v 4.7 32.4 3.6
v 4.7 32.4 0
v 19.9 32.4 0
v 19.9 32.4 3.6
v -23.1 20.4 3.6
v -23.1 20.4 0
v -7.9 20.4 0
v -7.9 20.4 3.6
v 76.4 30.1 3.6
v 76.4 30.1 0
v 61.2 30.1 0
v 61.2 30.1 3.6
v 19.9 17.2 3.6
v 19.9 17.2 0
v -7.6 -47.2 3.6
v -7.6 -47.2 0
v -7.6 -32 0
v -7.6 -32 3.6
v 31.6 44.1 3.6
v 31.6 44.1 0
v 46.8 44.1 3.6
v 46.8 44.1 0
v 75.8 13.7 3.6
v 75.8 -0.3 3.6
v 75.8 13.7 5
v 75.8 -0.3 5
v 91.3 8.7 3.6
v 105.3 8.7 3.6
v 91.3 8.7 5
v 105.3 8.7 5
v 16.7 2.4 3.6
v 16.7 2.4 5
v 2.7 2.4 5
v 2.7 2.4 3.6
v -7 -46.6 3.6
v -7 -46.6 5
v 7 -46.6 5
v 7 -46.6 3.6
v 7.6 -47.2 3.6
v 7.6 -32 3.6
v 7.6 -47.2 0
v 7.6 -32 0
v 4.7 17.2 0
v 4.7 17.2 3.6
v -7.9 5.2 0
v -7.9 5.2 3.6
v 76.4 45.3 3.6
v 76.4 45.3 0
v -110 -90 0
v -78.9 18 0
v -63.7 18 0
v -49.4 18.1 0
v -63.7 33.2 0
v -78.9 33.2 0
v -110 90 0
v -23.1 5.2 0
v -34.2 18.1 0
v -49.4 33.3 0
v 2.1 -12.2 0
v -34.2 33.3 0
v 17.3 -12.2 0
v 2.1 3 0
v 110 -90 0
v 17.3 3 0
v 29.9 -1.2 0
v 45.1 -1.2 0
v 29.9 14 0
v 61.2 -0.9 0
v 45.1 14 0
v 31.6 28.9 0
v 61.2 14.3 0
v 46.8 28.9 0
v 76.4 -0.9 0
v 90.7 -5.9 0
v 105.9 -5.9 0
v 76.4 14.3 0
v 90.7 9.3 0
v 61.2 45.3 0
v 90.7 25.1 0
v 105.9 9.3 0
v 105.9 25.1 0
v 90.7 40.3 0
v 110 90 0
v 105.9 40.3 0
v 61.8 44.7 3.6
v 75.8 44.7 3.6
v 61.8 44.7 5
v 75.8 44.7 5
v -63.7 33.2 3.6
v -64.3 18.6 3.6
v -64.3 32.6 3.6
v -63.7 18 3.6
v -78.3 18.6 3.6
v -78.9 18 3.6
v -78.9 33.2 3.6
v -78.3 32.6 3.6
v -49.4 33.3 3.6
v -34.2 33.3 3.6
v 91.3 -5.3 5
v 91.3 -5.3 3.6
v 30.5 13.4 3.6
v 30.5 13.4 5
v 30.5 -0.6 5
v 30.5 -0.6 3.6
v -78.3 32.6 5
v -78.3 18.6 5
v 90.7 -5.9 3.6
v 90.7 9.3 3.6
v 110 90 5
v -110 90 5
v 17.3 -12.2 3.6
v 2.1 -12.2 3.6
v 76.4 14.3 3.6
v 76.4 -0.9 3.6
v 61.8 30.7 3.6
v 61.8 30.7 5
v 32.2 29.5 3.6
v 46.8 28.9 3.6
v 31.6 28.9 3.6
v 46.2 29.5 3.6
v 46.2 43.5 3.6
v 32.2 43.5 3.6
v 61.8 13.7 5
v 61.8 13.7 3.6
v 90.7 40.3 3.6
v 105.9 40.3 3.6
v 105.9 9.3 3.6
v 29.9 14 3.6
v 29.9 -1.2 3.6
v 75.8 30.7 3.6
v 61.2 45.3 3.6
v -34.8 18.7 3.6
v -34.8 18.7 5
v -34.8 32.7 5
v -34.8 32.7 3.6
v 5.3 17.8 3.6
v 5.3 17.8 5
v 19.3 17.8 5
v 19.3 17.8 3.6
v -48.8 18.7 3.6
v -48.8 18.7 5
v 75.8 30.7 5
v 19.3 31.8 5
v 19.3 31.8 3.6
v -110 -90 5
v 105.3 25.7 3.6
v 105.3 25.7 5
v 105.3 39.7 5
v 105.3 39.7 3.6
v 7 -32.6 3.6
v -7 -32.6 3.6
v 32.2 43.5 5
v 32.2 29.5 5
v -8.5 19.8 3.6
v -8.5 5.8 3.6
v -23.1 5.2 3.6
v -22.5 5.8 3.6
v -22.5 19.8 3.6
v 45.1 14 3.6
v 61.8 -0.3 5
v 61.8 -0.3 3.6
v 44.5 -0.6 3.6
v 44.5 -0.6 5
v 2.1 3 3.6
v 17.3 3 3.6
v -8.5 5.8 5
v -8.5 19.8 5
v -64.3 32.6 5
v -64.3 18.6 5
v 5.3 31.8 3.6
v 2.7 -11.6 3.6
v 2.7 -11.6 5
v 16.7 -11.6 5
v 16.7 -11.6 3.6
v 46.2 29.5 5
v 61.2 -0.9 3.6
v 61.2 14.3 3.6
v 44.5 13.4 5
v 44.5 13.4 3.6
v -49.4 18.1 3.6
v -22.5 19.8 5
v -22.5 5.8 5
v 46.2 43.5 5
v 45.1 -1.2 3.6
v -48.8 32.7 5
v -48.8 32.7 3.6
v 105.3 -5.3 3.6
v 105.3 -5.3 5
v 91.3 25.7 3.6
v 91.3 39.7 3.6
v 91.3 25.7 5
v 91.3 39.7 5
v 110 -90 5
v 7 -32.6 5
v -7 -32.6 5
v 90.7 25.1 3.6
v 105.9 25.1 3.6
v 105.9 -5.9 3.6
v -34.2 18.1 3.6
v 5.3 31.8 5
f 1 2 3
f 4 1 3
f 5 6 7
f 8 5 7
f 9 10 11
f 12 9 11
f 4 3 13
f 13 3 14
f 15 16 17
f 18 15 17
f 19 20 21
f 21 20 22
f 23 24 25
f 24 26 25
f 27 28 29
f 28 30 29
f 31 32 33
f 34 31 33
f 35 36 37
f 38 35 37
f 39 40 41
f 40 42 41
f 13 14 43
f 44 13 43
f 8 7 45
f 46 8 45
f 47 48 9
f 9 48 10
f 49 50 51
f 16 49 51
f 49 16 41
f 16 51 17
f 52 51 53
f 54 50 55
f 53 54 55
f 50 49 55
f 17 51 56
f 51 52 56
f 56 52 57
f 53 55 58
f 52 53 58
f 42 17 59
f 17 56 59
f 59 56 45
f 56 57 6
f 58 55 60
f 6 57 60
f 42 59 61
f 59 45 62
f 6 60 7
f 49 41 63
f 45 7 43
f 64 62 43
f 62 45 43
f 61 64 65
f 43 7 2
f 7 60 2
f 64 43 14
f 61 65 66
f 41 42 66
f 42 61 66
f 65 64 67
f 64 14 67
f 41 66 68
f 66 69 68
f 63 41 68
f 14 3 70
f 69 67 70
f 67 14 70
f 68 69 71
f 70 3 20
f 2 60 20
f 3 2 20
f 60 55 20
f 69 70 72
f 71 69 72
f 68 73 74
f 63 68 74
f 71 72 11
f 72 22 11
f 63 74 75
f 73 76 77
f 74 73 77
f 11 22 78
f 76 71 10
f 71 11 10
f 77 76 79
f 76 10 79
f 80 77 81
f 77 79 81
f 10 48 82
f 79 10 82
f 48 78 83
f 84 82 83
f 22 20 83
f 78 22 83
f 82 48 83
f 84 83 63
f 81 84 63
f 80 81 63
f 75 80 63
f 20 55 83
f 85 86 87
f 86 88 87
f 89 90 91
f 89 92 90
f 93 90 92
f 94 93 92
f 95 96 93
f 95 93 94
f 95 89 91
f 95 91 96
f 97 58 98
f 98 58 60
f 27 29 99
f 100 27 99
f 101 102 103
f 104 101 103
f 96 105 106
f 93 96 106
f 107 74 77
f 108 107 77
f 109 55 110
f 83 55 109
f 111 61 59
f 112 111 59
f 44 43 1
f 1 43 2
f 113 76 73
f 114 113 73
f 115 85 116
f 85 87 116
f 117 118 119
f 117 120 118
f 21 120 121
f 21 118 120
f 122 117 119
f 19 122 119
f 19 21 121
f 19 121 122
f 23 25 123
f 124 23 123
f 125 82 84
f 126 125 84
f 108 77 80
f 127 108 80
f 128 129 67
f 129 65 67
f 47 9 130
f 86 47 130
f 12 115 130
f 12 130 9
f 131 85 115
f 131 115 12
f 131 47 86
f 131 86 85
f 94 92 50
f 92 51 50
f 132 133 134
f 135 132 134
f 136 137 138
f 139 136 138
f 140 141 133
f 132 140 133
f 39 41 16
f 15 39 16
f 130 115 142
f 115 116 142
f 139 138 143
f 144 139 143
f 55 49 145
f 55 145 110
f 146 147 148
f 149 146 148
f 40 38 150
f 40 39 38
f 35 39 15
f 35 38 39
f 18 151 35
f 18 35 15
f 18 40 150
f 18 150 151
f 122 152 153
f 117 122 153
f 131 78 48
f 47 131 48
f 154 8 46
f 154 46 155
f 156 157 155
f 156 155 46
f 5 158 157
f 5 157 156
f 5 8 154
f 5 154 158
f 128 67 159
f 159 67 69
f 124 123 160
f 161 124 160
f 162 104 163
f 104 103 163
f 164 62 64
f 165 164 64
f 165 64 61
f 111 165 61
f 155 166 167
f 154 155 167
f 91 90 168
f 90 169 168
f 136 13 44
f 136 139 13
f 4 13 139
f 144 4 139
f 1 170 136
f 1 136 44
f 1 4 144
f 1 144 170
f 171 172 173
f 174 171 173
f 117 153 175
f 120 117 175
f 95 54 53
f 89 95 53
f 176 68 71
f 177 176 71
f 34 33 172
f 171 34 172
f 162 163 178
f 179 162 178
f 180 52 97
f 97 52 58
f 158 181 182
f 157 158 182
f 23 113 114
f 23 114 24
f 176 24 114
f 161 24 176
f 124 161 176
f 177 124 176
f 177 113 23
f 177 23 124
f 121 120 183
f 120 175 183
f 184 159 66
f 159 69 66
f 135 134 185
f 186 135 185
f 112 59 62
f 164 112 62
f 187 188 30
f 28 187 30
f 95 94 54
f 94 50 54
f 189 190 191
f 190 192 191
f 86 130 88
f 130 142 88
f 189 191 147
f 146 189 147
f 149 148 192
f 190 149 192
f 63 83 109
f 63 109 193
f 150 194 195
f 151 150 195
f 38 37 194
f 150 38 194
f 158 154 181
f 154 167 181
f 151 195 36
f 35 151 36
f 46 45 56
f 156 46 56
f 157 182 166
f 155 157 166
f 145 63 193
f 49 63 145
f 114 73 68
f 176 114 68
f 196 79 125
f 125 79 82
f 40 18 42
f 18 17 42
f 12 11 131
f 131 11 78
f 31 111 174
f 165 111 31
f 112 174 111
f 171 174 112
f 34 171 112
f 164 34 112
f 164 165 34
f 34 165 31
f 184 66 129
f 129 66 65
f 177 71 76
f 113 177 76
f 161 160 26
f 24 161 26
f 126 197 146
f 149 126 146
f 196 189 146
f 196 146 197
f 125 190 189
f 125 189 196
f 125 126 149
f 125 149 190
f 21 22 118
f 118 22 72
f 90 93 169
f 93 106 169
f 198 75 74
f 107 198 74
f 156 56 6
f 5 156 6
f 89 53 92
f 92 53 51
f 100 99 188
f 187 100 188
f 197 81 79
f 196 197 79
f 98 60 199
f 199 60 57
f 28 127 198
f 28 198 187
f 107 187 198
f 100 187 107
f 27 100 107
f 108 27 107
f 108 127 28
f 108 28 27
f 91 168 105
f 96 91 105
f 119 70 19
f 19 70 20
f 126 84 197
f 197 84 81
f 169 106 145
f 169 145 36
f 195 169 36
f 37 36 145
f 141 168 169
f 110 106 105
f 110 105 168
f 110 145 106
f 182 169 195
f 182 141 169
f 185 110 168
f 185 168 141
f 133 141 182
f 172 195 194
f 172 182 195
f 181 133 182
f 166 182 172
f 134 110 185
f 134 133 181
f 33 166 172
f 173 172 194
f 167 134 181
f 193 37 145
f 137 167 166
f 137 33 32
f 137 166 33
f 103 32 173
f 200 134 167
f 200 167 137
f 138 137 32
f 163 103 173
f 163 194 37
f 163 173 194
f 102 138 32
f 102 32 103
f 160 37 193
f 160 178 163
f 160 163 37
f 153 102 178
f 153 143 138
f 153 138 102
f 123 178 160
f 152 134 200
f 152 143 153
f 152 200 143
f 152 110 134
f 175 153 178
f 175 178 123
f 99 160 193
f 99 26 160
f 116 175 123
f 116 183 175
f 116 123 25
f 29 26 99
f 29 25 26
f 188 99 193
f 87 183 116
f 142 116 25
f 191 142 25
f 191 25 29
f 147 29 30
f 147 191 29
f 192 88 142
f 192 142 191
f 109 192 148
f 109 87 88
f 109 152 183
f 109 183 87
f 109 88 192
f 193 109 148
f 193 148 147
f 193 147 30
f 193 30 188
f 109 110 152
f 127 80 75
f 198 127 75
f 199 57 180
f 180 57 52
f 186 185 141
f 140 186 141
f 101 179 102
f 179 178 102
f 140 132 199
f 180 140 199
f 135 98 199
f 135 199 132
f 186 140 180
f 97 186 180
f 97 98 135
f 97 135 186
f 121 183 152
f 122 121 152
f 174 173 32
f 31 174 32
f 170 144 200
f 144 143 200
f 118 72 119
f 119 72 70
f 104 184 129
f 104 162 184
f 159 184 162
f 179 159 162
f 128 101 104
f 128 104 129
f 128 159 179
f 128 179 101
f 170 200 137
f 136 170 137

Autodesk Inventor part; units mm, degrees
ref_plane "YZ Plane" through (0, 0, 0) normal (1, 0, 0) x (0, 1, 0)
ref_plane "XZ Plane" through (0, 0, 0) normal (0, 1, 0) x (-1, 0, 0)
ref_plane "XY Plane" through (0, 0, 0) normal (0, 0, 1) x (1, 0, 0)
sketch "Sketch1" plane through (0, 0, 0) normal (0, 0, 1) x (1, 0, 0)
  line L0 (-110, 90) -> (110, 90)
  line L1 (110, 90) -> (110, -90)
  line L2 (110, -90) -> (-110, -90)
  line L3 (-110, -90) -> (-110, 90)
  line L4 (-110, 90) -> (110, -90) construction
  line L5 (110, 90) -> (-110, -90) construction
  point P0 (0, 0)
  dimension "d0" = 220
  dimension "d1" = 180
extrude "Extrusion1" add sketch "Sketch1" along normal blind 5
sketch "Sketch2" plane through (0, 0, 5) normal (0, 0, 1) x (1, 0, 0)
  line L0 (-110, -90) -> (110, -90) projected
  point P0 (0, 0)
  point P1 (0, -39.6)
  point P2 (-15.5, 12.8)
  point P3 (-41.8, 25.7)
  point P4 (-71.3, 25.6)
  point P5 (9.7, -4.6)
  point P6 (12.3, 24.8)
  point P7 (37.5, 6.4)
  point P8 (39.2, 36.5)
  point P9 (68.8, 6.7)
  point P10 (68.8, 37.7)
  point P11 (98.3, 1.7)
  point P12 (98.3, 32.7)
  dimension "d4" = 50.4
  dimension "d5" = 15.5
  dimension "d6" = 26.3
  dimension "d7" = 29.5
  dimension "d11" = 52.4
  dimension "d12" = 65.3
  dimension "d13" = 65.2
  dimension "d14" = 9.7
  dimension "d15" = 29.4
  dimension "d16" = 2.6
  dimension "d17" = 26.9
  dimension "d18" = 29.6
  dimension "d19" = 29.5
  dimension "d20" = 1.7
  dimension "d22" = 46
  dimension "d23" = 30.1
  dimension "d24" = 96.7
  dimension "d25" = 91.7
  dimension "d26" = 31
  dimension "d27" = 31
  dimension "d28" = 35
hole "Hole1" at (0, -39.6, 5) at (-15.5, 12.8, 5) at (-41.8, 25.7, 5) at (-71.3, 25.6, 5) at (9.7, -4.6, 5) at (12.3, 24.8, 5) at (37.5, 6.4, 5) at (39.2, 36.5, 5) at (68.8, 6.7, 5) at (68.8, 37.7, 5) at (98.3, 1.7, 5) at (98.3, 32.7, 5) direction (0, 0, -1) diameter 3 end through all
sketch "Sketch3" plane through (0, 0, 5) normal (0, 0, 1) x (1, 0, 0)
  circle A0 centre (98.3, 1.7) radius 1.5 construction
  circle A1 centre (68.8, 6.7) radius 1.5 construction
  circle A2 centre (37.5, 6.4) radius 1.5 construction
  circle A3 centre (9.7, -4.6) radius 1.5 construction
  circle A4 centre (-41.8, 25.7) radius 1.5 construction
  circle A5 centre (0, -39.6) radius 1.5 construction
  circle A6 centre (-15.5, 12.8) radius 1.5 construction
  circle A7 centre (-71.3, 25.6) radius 1.5 construction
  circle A8 centre (12.3, 24.8) radius 1.5 construction
  circle A9 centre (39.2, 36.5) radius 1.5 construction
  circle A10 centre (68.8, 37.7) radius 1.5 construction
  circle A11 centre (98.3, 32.7) radius 1.5 construction
  line L0 (-110, -90) -> (110, -90) projected
  line L1 (110, -90) -> (110, 90) projected
  line L2 (110, 90) -> (-110, 90) projected
  line L3 (-110, 90) -> (-110, -90) projected
  line L4 (7, -32.6) -> (-7, -32.6)
  line L5 (-7, -32.6) -> (-7, -46.6)
  line L6 (-7, -46.6) -> (7, -46.6)
  line L7 (7, -46.6) -> (7, -32.6)
  circle A12 centre (0, -39.6) radius 1.5 construction
  line L8 (7, -32.6) -> (-7, -46.6) construction
  line L9 (-7, -32.6) -> (7, -46.6) construction
  line L10 (-8.5, 19.8) -> (-22.5, 19.8)
  line L11 (-22.5, 19.8) -> (-22.5, 5.8)
  line L12 (-22.5, 5.8) -> (-8.5, 5.8)
  line L13 (-8.5, 5.8) -> (-8.5, 19.8)
  line L14 (-8.5, 19.8) -> (-22.5, 5.8) construction
  line L15 (-22.5, 19.8) -> (-8.5, 5.8) construction
  line L16 (-34.8, 32.7) -> (-48.8, 32.7)
  line L17 (-48.8, 32.7) -> (-48.8, 18.7)
  line L18 (-48.8, 18.7) -> (-34.8, 18.7)
  line L19 (-34.8, 18.7) -> (-34.8, 32.7)
  line L20 (-34.8, 32.7) -> (-48.8, 18.7) construction
  line L21 (-48.8, 32.7) -> (-34.8, 18.7) construction
  line L22 (-64.3, 32.6) -> (-78.3, 32.6)
  line L23 (-78.3, 32.6) -> (-78.3, 18.6)
  line L24 (-78.3, 18.6) -> (-64.3, 18.6)
  line L25 (-64.3, 18.6) -> (-64.3, 32.6)
  line L26 (-64.3, 32.6) -> (-78.3, 18.6) construction
  line L27 (-78.3, 32.6) -> (-64.3, 18.6) construction
  line L28 (2.7, 2.4) -> (2.7, -11.6)
  line L29 (16.7, 2.4) -> (2.7, 2.4)
  line L30 (2.7, 2.4) -> (16.7, -11.6) construction
  line L31 (2.7, -11.6) -> (16.7, -11.6)
  line L32 (16.7, 2.4) -> (2.7, -11.6) construction
  line L33 (16.7, -11.6) -> (16.7, 2.4)
  line L34 (5.3, 31.8) -> (5.3, 17.8)
  line L35 (19.3, 31.8) -> (5.3, 31.8)
  line L36 (5.3, 31.8) -> (19.3, 17.8) construction
  line L37 (5.3, 17.8) -> (19.3, 17.8)
  line L38 (19.3, 31.8) -> (5.3, 17.8) construction
  line L39 (19.3, 17.8) -> (19.3, 31.8)
  line L40 (30.5, 13.4) -> (30.5, -0.6)
  line L41 (44.5, 13.4) -> (30.5, 13.4)
  line L42 (30.5, 13.4) -> (44.5, -0.6) construction
  line L43 (30.5, -0.6) -> (44.5, -0.6)
  line L44 (44.5, 13.4) -> (30.5, -0.6) construction
  line L45 (44.5, -0.6) -> (44.5, 13.4)
  line L46 (32.2, 43.5) -> (32.2, 29.5)
  line L47 (46.2, 43.5) -> (32.2, 43.5)
  line L48 (32.2, 43.5) -> (46.2, 29.5) construction
  line L49 (32.2, 29.5) -> (46.2, 29.5)
  line L50 (46.2, 43.5) -> (32.2, 29.5) construction
  line L51 (46.2, 29.5) -> (46.2, 43.5)
  line L52 (61.8, 13.7) -> (61.8, -0.3)
  line L53 (75.8, 13.7) -> (61.8, 13.7)
  line L54 (61.8, 13.7) -> (75.8, -0.3) construction
  line L55 (61.8, -0.3) -> (75.8, -0.3)
  line L56 (75.8, 13.7) -> (61.8, -0.3) construction
  line L57 (75.8, -0.3) -> (75.8, 13.7)
  line L58 (61.8, 44.7) -> (61.8, 30.7)
  line L59 (75.8, 44.7) -> (61.8, 44.7)
  line L60 (61.8, 44.7) -> (75.8, 30.7) construction
  line L61 (61.8, 30.7) -> (75.8, 30.7)
  line L62 (75.8, 44.7) -> (61.8, 30.7) construction
  line L63 (75.8, 30.7) -> (75.8, 44.7)
  line L64 (91.3, 8.7) -> (91.3, -5.3)
  line L65 (105.3, 8.7) -> (91.3, 8.7)
  line L66 (91.3, 8.7) -> (105.3, -5.3) construction
  line L67 (91.3, -5.3) -> (105.3, -5.3)
  line L68 (105.3, 8.7) -> (91.3, -5.3) construction
  line L69 (105.3, -5.3) -> (105.3, 8.7)
  line L70 (91.3, 39.7) -> (91.3, 25.7)
  line L71 (105.3, 39.7) -> (91.3, 39.7)
  line L72 (91.3, 39.7) -> (105.3, 25.7) construction
  line L73 (91.3, 25.7) -> (105.3, 25.7)
  line L74 (105.3, 39.7) -> (91.3, 25.7) construction
  line L75 (105.3, 25.7) -> (105.3, 39.7)
  point P0 (0, 0)
  point P1 (-15.5, 12.8)
  point P2 (9.7, -4.6)
  point P3 (37.5, 6.4)
  point P4 (68.8, 6.7)
  point P5 (68.8, 37.7)
  point P6 (98.3, 1.7)
  dimension "d36" = 14
extrude "Extrusion2" cut sketch "Sketch3" against normal through all contours L7 L6 L5 L4 | L13 L12 L11 L10 | L19 L18 L17 L16 | L25 L24 L23 L22 | L29 L33 L31 L28 | L35 L39 L37 L34 | L41 L45 L43 L40 | L47 L51 L49 L46 | L53 L57 L55 L52 | L59 L63 L61 L58 | L65 L69 L67 L64 | L71 L75 L73 L70
sketch "Sketch4" plane through (0, 0, 0) normal (0, 0, -1) x (-1, 0, 0)
  line L0 (8.5, 5.8) -> (8.5, 19.8) construction
  line L1 (8.5, 19.8) -> (22.5, 19.8) construction
  line L2 (22.5, 19.8) -> (22.5, 5.8) construction
  line L3 (22.5, 5.8) -> (8.5, 5.8) construction
  line L4 (-46.2, 29.5) -> (-46.2, 43.5) construction
  line L5 (-46.2, 43.5) -> (-32.2, 43.5) construction
  line L6 (-32.2, 43.5) -> (-32.2, 29.5) construction
  line L7 (-32.2, 29.5) -> (-46.2, 29.5) construction
  line L8 (-105.3, 25.7) -> (-105.3, 39.7) construction
  line L9 (-105.3, 39.7) -> (-91.3, 39.7) construction
  line L10 (-91.3, 39.7) -> (-91.3, 25.7) construction
  line L11 (-91.3, 25.7) -> (-105.3, 25.7) construction
  line L12 (-75.8, 30.7) -> (-75.8, 44.7) construction
  line L13 (-75.8, 44.7) -> (-61.8, 44.7) construction
  line L14 (-61.8, 44.7) -> (-61.8, 30.7) construction
  line L15 (-61.8, 30.7) -> (-75.8, 30.7) construction
  line L16 (-19.3, 17.8) -> (-19.3, 31.8) construction
  line L17 (-19.3, 31.8) -> (-5.3, 31.8) construction
  line L18 (-5.3, 31.8) -> (-5.3, 17.8) construction
  line L19 (-5.3, 17.8) -> (-19.3, 17.8) construction
  line L20 (34.8, 18.7) -> (34.8, 32.7) construction
  line L21 (34.8, 32.7) -> (48.8, 32.7) construction
  line L22 (48.8, 32.7) -> (48.8, 18.7) construction
  line L23 (48.8, 18.7) -> (34.8, 18.7) construction
  line L24 (-16.7, -11.6) -> (-16.7, 2.4) construction
  line L25 (-16.7, 2.4) -> (-2.7, 2.4) construction
  line L26 (-2.7, 2.4) -> (-2.7, -11.6) construction
  line L27 (-2.7, -11.6) -> (-16.7, -11.6) construction
  line L28 (-44.5, -0.6) -> (-44.5, 13.4) construction
  line L29 (-44.5, 13.4) -> (-30.5, 13.4) construction
  line L30 (-30.5, 13.4) -> (-30.5, -0.6) construction
  line L31 (-30.5, -0.6) -> (-44.5, -0.6) construction
  line L32 (-105.3, -5.3) -> (-105.3, 8.7) construction
  line L33 (-105.3, 8.7) -> (-91.3, 8.7) construction
  line L34 (-91.3, 8.7) -> (-91.3, -5.3) construction
  line L35 (-91.3, -5.3) -> (-105.3, -5.3) construction
  line L36 (-75.8, -0.3) -> (-75.8, 13.7) construction
  line L37 (-75.8, 13.7) -> (-61.8, 13.7) construction
  line L38 (-61.8, 13.7) -> (-61.8, -0.3) construction
  line L39 (-61.8, -0.3) -> (-75.8, -0.3) construction
  line L40 (7, -46.6) -> (-7, -46.6) construction
  line L41 (-7, -46.6) -> (-7, -32.6) construction
  line L42 (-7, -32.6) -> (7, -32.6) construction
  line L43 (7, -32.6) -> (7, -46.6) construction
  line L44 (64.3, 18.6) -> (64.3, 32.6) construction
  line L45 (64.3, 32.6) -> (78.3, 32.6) construction
  line L46 (78.3, 32.6) -> (78.3, 18.6) construction
  line L47 (78.3, 18.6) -> (64.3, 18.6) construction
  line L48 (110, -90) -> (-110, -90) construction
  line L49 (110, 90) -> (110, -90) construction
  line L50 (-110, 90) -> (110, 90) construction
  line L51 (-110, -90) -> (-110, 90) construction
  line L52 (-7.6, -47.2) -> (7.6, -47.2)
  line L53 (7.6, -47.2) -> (7.6, -32)
  line L54 (7.6, -32) -> (-7.6, -32)
  line L55 (-7.6, -32) -> (-7.6, -47.2)
  line L56 (-7.6, -47.2) -> (7.6, -32) construction
  line L57 (7.6, -47.2) -> (-7.6, -32) construction
  line L58 (7.9, 5.2) -> (23.1, 5.2)
  line L59 (23.1, 5.2) -> (23.1, 20.4)
  line L60 (23.1, 20.4) -> (7.9, 20.4)
  line L61 (7.9, 20.4) -> (7.9, 5.2)
  line L62 (7.9, 5.2) -> (23.1, 20.4) construction
  line L63 (23.1, 5.2) -> (7.9, 20.4) construction
  line L64 (34.2, 18.1) -> (49.4, 18.1)
  line L65 (49.4, 18.1) -> (49.4, 33.3)
  line L66 (49.4, 33.3) -> (34.2, 33.3)
  line L67 (34.2, 33.3) -> (34.2, 18.1)
  line L68 (34.2, 18.1) -> (49.4, 33.3) construction
  line L69 (49.4, 18.1) -> (34.2, 33.3) construction
  line L70 (63.7, 18) -> (78.9, 18)
  line L71 (78.9, 18) -> (78.9, 33.2)
  line L72 (78.9, 33.2) -> (63.7, 33.2)
  line L73 (63.7, 33.2) -> (63.7, 18)
  line L74 (63.7, 18) -> (78.9, 33.2) construction
  line L75 (78.9, 18) -> (63.7, 33.2) construction
  line L76 (-2.1, -12.2) -> (-17.3, 3) construction
  line L77 (-2.1, -12.2) -> (-2.1, 3)
  line L78 (-17.3, -12.2) -> (-2.1, 3) construction
  line L79 (-17.3, -12.2) -> (-2.1, -12.2)
  line L80 (-17.3, 3) -> (-17.3, -12.2)
  line L81 (-2.1, 3) -> (-17.3, 3)
  line L82 (-4.7, 17.2) -> (-19.9, 32.4) construction
  line L83 (-4.7, 17.2) -> (-4.7, 32.4)
  line L84 (-19.9, 17.2) -> (-4.7, 32.4) construction
  line L85 (-19.9, 17.2) -> (-4.7, 17.2)
  line L86 (-19.9, 32.4) -> (-19.9, 17.2)
  line L87 (-4.7, 32.4) -> (-19.9, 32.4)
  line L88 (-29.9, -1.2) -> (-45.1, 14) construction
  line L89 (-29.9, -1.2) -> (-29.9, 14)
  line L90 (-45.1, -1.2) -> (-29.9, 14) construction
  line L91 (-45.1, -1.2) -> (-29.9, -1.2)
  line L92 (-45.1, 14) -> (-45.1, -1.2)
  line L93 (-29.9, 14) -> (-45.1, 14)
  line L94 (-31.6, 28.9) -> (-46.8, 44.1) construction
  line L95 (-31.6, 28.9) -> (-31.6, 44.1)
  line L96 (-46.8, 28.9) -> (-31.6, 44.1) construction
  line L97 (-46.8, 28.9) -> (-31.6, 28.9)
  line L98 (-46.8, 44.1) -> (-46.8, 28.9)
  line L99 (-31.6, 44.1) -> (-46.8, 44.1)
  line L100 (-61.2, -0.9) -> (-76.4, 14.3) construction
  line L101 (-61.2, -0.9) -> (-61.2, 14.3)
  line L102 (-76.4, -0.9) -> (-61.2, 14.3) construction
  line L103 (-76.4, -0.9) -> (-61.2, -0.9)
  line L104 (-76.4, 14.3) -> (-76.4, -0.9)
  line L105 (-61.2, 14.3) -> (-76.4, 14.3)
  line L106 (-61.2, 30.1) -> (-76.4, 45.3) construction
  line L107 (-61.2, 30.1) -> (-61.2, 45.3)
  line L108 (-76.4, 30.1) -> (-61.2, 45.3) construction
  line L109 (-76.4, 30.1) -> (-61.2, 30.1)
  line L110 (-76.4, 45.3) -> (-76.4, 30.1)
  line L111 (-61.2, 45.3) -> (-76.4, 45.3)
  line L112 (-90.7, 25.1) -> (-105.9, 40.3) construction
  line L113 (-90.7, 25.1) -> (-90.7, 40.3)
  line L114 (-105.9, 25.1) -> (-90.7, 40.3) construction
  line L115 (-105.9, 25.1) -> (-90.7, 25.1)
  line L116 (-105.9, 40.3) -> (-105.9, 25.1)
  line L117 (-90.7, 40.3) -> (-105.9, 40.3)
  line L118 (-90.7, -5.9) -> (-105.9, 9.3) construction
  line L119 (-90.7, -5.9) -> (-90.7, 9.3)
  line L120 (-105.9, -5.9) -> (-90.7, 9.3) construction
  line L121 (-105.9, -5.9) -> (-90.7, -5.9)
  line L122 (-105.9, 9.3) -> (-105.9, -5.9)
  line L123 (-90.7, 9.3) -> (-105.9, 9.3)
  point P0 (0, 0)
  point P1 (0, -39.6)
  point P2 (15.5, 12.8)
  point P3 (41.8, 25.7)
  point P4 (71.3, 25.6)
  point P5 (-9.7, -4.6)
  point P6 (-12.3, 24.8)
  point P7 (-37.5, 6.4)
  point P8 (-39.2, 36.5)
  point P9 (-68.8, 6.7)
  point P10 (-68.8, 37.7)
  point P11 (-98.3, 32.7)
  point P12 (-98.3, 1.7)
  point P13 (0, -32.6)
  point P14 (15.5, 19.8)
  point P15 (41.8, 32.7)
  point P16 (71.3, 32.6)
  point P17 (-9.7, 2.4)
  point P18 (-12.3, 31.8)
  point P19 (-39.2, 43.5)
  point P20 (-68.8, 44.7)
  point P21 (-37.5, 13.4)
  point P22 (-68.8, 13.7)
  point P23 (-98.3, 8.7)
  point P24 (-98.3, 39.7)
  point P25 (-91.3, 32.7)
  point P26 (-91.3, 1.7)
  point P27 (-61.8, 6.7)
  point P28 (-61.8, 37.7)
  point P29 (-46.2, 36.5)
  point P30 (-30.5, 6.4)
  point P31 (-5.3, 24.8)
  point P32 (-2.7, -4.6)
  point P33 (22.5, 12.8)
  point P34 (48.8, 25.7)
  point P35 (78.3, 25.6)
  point P36 (7, -39.6)
  dimension "d46" = 15.2
extrude "Extrusion3" cut sketch "Sketch4" against normal blind 3.6
properties part number "Top Plate"
